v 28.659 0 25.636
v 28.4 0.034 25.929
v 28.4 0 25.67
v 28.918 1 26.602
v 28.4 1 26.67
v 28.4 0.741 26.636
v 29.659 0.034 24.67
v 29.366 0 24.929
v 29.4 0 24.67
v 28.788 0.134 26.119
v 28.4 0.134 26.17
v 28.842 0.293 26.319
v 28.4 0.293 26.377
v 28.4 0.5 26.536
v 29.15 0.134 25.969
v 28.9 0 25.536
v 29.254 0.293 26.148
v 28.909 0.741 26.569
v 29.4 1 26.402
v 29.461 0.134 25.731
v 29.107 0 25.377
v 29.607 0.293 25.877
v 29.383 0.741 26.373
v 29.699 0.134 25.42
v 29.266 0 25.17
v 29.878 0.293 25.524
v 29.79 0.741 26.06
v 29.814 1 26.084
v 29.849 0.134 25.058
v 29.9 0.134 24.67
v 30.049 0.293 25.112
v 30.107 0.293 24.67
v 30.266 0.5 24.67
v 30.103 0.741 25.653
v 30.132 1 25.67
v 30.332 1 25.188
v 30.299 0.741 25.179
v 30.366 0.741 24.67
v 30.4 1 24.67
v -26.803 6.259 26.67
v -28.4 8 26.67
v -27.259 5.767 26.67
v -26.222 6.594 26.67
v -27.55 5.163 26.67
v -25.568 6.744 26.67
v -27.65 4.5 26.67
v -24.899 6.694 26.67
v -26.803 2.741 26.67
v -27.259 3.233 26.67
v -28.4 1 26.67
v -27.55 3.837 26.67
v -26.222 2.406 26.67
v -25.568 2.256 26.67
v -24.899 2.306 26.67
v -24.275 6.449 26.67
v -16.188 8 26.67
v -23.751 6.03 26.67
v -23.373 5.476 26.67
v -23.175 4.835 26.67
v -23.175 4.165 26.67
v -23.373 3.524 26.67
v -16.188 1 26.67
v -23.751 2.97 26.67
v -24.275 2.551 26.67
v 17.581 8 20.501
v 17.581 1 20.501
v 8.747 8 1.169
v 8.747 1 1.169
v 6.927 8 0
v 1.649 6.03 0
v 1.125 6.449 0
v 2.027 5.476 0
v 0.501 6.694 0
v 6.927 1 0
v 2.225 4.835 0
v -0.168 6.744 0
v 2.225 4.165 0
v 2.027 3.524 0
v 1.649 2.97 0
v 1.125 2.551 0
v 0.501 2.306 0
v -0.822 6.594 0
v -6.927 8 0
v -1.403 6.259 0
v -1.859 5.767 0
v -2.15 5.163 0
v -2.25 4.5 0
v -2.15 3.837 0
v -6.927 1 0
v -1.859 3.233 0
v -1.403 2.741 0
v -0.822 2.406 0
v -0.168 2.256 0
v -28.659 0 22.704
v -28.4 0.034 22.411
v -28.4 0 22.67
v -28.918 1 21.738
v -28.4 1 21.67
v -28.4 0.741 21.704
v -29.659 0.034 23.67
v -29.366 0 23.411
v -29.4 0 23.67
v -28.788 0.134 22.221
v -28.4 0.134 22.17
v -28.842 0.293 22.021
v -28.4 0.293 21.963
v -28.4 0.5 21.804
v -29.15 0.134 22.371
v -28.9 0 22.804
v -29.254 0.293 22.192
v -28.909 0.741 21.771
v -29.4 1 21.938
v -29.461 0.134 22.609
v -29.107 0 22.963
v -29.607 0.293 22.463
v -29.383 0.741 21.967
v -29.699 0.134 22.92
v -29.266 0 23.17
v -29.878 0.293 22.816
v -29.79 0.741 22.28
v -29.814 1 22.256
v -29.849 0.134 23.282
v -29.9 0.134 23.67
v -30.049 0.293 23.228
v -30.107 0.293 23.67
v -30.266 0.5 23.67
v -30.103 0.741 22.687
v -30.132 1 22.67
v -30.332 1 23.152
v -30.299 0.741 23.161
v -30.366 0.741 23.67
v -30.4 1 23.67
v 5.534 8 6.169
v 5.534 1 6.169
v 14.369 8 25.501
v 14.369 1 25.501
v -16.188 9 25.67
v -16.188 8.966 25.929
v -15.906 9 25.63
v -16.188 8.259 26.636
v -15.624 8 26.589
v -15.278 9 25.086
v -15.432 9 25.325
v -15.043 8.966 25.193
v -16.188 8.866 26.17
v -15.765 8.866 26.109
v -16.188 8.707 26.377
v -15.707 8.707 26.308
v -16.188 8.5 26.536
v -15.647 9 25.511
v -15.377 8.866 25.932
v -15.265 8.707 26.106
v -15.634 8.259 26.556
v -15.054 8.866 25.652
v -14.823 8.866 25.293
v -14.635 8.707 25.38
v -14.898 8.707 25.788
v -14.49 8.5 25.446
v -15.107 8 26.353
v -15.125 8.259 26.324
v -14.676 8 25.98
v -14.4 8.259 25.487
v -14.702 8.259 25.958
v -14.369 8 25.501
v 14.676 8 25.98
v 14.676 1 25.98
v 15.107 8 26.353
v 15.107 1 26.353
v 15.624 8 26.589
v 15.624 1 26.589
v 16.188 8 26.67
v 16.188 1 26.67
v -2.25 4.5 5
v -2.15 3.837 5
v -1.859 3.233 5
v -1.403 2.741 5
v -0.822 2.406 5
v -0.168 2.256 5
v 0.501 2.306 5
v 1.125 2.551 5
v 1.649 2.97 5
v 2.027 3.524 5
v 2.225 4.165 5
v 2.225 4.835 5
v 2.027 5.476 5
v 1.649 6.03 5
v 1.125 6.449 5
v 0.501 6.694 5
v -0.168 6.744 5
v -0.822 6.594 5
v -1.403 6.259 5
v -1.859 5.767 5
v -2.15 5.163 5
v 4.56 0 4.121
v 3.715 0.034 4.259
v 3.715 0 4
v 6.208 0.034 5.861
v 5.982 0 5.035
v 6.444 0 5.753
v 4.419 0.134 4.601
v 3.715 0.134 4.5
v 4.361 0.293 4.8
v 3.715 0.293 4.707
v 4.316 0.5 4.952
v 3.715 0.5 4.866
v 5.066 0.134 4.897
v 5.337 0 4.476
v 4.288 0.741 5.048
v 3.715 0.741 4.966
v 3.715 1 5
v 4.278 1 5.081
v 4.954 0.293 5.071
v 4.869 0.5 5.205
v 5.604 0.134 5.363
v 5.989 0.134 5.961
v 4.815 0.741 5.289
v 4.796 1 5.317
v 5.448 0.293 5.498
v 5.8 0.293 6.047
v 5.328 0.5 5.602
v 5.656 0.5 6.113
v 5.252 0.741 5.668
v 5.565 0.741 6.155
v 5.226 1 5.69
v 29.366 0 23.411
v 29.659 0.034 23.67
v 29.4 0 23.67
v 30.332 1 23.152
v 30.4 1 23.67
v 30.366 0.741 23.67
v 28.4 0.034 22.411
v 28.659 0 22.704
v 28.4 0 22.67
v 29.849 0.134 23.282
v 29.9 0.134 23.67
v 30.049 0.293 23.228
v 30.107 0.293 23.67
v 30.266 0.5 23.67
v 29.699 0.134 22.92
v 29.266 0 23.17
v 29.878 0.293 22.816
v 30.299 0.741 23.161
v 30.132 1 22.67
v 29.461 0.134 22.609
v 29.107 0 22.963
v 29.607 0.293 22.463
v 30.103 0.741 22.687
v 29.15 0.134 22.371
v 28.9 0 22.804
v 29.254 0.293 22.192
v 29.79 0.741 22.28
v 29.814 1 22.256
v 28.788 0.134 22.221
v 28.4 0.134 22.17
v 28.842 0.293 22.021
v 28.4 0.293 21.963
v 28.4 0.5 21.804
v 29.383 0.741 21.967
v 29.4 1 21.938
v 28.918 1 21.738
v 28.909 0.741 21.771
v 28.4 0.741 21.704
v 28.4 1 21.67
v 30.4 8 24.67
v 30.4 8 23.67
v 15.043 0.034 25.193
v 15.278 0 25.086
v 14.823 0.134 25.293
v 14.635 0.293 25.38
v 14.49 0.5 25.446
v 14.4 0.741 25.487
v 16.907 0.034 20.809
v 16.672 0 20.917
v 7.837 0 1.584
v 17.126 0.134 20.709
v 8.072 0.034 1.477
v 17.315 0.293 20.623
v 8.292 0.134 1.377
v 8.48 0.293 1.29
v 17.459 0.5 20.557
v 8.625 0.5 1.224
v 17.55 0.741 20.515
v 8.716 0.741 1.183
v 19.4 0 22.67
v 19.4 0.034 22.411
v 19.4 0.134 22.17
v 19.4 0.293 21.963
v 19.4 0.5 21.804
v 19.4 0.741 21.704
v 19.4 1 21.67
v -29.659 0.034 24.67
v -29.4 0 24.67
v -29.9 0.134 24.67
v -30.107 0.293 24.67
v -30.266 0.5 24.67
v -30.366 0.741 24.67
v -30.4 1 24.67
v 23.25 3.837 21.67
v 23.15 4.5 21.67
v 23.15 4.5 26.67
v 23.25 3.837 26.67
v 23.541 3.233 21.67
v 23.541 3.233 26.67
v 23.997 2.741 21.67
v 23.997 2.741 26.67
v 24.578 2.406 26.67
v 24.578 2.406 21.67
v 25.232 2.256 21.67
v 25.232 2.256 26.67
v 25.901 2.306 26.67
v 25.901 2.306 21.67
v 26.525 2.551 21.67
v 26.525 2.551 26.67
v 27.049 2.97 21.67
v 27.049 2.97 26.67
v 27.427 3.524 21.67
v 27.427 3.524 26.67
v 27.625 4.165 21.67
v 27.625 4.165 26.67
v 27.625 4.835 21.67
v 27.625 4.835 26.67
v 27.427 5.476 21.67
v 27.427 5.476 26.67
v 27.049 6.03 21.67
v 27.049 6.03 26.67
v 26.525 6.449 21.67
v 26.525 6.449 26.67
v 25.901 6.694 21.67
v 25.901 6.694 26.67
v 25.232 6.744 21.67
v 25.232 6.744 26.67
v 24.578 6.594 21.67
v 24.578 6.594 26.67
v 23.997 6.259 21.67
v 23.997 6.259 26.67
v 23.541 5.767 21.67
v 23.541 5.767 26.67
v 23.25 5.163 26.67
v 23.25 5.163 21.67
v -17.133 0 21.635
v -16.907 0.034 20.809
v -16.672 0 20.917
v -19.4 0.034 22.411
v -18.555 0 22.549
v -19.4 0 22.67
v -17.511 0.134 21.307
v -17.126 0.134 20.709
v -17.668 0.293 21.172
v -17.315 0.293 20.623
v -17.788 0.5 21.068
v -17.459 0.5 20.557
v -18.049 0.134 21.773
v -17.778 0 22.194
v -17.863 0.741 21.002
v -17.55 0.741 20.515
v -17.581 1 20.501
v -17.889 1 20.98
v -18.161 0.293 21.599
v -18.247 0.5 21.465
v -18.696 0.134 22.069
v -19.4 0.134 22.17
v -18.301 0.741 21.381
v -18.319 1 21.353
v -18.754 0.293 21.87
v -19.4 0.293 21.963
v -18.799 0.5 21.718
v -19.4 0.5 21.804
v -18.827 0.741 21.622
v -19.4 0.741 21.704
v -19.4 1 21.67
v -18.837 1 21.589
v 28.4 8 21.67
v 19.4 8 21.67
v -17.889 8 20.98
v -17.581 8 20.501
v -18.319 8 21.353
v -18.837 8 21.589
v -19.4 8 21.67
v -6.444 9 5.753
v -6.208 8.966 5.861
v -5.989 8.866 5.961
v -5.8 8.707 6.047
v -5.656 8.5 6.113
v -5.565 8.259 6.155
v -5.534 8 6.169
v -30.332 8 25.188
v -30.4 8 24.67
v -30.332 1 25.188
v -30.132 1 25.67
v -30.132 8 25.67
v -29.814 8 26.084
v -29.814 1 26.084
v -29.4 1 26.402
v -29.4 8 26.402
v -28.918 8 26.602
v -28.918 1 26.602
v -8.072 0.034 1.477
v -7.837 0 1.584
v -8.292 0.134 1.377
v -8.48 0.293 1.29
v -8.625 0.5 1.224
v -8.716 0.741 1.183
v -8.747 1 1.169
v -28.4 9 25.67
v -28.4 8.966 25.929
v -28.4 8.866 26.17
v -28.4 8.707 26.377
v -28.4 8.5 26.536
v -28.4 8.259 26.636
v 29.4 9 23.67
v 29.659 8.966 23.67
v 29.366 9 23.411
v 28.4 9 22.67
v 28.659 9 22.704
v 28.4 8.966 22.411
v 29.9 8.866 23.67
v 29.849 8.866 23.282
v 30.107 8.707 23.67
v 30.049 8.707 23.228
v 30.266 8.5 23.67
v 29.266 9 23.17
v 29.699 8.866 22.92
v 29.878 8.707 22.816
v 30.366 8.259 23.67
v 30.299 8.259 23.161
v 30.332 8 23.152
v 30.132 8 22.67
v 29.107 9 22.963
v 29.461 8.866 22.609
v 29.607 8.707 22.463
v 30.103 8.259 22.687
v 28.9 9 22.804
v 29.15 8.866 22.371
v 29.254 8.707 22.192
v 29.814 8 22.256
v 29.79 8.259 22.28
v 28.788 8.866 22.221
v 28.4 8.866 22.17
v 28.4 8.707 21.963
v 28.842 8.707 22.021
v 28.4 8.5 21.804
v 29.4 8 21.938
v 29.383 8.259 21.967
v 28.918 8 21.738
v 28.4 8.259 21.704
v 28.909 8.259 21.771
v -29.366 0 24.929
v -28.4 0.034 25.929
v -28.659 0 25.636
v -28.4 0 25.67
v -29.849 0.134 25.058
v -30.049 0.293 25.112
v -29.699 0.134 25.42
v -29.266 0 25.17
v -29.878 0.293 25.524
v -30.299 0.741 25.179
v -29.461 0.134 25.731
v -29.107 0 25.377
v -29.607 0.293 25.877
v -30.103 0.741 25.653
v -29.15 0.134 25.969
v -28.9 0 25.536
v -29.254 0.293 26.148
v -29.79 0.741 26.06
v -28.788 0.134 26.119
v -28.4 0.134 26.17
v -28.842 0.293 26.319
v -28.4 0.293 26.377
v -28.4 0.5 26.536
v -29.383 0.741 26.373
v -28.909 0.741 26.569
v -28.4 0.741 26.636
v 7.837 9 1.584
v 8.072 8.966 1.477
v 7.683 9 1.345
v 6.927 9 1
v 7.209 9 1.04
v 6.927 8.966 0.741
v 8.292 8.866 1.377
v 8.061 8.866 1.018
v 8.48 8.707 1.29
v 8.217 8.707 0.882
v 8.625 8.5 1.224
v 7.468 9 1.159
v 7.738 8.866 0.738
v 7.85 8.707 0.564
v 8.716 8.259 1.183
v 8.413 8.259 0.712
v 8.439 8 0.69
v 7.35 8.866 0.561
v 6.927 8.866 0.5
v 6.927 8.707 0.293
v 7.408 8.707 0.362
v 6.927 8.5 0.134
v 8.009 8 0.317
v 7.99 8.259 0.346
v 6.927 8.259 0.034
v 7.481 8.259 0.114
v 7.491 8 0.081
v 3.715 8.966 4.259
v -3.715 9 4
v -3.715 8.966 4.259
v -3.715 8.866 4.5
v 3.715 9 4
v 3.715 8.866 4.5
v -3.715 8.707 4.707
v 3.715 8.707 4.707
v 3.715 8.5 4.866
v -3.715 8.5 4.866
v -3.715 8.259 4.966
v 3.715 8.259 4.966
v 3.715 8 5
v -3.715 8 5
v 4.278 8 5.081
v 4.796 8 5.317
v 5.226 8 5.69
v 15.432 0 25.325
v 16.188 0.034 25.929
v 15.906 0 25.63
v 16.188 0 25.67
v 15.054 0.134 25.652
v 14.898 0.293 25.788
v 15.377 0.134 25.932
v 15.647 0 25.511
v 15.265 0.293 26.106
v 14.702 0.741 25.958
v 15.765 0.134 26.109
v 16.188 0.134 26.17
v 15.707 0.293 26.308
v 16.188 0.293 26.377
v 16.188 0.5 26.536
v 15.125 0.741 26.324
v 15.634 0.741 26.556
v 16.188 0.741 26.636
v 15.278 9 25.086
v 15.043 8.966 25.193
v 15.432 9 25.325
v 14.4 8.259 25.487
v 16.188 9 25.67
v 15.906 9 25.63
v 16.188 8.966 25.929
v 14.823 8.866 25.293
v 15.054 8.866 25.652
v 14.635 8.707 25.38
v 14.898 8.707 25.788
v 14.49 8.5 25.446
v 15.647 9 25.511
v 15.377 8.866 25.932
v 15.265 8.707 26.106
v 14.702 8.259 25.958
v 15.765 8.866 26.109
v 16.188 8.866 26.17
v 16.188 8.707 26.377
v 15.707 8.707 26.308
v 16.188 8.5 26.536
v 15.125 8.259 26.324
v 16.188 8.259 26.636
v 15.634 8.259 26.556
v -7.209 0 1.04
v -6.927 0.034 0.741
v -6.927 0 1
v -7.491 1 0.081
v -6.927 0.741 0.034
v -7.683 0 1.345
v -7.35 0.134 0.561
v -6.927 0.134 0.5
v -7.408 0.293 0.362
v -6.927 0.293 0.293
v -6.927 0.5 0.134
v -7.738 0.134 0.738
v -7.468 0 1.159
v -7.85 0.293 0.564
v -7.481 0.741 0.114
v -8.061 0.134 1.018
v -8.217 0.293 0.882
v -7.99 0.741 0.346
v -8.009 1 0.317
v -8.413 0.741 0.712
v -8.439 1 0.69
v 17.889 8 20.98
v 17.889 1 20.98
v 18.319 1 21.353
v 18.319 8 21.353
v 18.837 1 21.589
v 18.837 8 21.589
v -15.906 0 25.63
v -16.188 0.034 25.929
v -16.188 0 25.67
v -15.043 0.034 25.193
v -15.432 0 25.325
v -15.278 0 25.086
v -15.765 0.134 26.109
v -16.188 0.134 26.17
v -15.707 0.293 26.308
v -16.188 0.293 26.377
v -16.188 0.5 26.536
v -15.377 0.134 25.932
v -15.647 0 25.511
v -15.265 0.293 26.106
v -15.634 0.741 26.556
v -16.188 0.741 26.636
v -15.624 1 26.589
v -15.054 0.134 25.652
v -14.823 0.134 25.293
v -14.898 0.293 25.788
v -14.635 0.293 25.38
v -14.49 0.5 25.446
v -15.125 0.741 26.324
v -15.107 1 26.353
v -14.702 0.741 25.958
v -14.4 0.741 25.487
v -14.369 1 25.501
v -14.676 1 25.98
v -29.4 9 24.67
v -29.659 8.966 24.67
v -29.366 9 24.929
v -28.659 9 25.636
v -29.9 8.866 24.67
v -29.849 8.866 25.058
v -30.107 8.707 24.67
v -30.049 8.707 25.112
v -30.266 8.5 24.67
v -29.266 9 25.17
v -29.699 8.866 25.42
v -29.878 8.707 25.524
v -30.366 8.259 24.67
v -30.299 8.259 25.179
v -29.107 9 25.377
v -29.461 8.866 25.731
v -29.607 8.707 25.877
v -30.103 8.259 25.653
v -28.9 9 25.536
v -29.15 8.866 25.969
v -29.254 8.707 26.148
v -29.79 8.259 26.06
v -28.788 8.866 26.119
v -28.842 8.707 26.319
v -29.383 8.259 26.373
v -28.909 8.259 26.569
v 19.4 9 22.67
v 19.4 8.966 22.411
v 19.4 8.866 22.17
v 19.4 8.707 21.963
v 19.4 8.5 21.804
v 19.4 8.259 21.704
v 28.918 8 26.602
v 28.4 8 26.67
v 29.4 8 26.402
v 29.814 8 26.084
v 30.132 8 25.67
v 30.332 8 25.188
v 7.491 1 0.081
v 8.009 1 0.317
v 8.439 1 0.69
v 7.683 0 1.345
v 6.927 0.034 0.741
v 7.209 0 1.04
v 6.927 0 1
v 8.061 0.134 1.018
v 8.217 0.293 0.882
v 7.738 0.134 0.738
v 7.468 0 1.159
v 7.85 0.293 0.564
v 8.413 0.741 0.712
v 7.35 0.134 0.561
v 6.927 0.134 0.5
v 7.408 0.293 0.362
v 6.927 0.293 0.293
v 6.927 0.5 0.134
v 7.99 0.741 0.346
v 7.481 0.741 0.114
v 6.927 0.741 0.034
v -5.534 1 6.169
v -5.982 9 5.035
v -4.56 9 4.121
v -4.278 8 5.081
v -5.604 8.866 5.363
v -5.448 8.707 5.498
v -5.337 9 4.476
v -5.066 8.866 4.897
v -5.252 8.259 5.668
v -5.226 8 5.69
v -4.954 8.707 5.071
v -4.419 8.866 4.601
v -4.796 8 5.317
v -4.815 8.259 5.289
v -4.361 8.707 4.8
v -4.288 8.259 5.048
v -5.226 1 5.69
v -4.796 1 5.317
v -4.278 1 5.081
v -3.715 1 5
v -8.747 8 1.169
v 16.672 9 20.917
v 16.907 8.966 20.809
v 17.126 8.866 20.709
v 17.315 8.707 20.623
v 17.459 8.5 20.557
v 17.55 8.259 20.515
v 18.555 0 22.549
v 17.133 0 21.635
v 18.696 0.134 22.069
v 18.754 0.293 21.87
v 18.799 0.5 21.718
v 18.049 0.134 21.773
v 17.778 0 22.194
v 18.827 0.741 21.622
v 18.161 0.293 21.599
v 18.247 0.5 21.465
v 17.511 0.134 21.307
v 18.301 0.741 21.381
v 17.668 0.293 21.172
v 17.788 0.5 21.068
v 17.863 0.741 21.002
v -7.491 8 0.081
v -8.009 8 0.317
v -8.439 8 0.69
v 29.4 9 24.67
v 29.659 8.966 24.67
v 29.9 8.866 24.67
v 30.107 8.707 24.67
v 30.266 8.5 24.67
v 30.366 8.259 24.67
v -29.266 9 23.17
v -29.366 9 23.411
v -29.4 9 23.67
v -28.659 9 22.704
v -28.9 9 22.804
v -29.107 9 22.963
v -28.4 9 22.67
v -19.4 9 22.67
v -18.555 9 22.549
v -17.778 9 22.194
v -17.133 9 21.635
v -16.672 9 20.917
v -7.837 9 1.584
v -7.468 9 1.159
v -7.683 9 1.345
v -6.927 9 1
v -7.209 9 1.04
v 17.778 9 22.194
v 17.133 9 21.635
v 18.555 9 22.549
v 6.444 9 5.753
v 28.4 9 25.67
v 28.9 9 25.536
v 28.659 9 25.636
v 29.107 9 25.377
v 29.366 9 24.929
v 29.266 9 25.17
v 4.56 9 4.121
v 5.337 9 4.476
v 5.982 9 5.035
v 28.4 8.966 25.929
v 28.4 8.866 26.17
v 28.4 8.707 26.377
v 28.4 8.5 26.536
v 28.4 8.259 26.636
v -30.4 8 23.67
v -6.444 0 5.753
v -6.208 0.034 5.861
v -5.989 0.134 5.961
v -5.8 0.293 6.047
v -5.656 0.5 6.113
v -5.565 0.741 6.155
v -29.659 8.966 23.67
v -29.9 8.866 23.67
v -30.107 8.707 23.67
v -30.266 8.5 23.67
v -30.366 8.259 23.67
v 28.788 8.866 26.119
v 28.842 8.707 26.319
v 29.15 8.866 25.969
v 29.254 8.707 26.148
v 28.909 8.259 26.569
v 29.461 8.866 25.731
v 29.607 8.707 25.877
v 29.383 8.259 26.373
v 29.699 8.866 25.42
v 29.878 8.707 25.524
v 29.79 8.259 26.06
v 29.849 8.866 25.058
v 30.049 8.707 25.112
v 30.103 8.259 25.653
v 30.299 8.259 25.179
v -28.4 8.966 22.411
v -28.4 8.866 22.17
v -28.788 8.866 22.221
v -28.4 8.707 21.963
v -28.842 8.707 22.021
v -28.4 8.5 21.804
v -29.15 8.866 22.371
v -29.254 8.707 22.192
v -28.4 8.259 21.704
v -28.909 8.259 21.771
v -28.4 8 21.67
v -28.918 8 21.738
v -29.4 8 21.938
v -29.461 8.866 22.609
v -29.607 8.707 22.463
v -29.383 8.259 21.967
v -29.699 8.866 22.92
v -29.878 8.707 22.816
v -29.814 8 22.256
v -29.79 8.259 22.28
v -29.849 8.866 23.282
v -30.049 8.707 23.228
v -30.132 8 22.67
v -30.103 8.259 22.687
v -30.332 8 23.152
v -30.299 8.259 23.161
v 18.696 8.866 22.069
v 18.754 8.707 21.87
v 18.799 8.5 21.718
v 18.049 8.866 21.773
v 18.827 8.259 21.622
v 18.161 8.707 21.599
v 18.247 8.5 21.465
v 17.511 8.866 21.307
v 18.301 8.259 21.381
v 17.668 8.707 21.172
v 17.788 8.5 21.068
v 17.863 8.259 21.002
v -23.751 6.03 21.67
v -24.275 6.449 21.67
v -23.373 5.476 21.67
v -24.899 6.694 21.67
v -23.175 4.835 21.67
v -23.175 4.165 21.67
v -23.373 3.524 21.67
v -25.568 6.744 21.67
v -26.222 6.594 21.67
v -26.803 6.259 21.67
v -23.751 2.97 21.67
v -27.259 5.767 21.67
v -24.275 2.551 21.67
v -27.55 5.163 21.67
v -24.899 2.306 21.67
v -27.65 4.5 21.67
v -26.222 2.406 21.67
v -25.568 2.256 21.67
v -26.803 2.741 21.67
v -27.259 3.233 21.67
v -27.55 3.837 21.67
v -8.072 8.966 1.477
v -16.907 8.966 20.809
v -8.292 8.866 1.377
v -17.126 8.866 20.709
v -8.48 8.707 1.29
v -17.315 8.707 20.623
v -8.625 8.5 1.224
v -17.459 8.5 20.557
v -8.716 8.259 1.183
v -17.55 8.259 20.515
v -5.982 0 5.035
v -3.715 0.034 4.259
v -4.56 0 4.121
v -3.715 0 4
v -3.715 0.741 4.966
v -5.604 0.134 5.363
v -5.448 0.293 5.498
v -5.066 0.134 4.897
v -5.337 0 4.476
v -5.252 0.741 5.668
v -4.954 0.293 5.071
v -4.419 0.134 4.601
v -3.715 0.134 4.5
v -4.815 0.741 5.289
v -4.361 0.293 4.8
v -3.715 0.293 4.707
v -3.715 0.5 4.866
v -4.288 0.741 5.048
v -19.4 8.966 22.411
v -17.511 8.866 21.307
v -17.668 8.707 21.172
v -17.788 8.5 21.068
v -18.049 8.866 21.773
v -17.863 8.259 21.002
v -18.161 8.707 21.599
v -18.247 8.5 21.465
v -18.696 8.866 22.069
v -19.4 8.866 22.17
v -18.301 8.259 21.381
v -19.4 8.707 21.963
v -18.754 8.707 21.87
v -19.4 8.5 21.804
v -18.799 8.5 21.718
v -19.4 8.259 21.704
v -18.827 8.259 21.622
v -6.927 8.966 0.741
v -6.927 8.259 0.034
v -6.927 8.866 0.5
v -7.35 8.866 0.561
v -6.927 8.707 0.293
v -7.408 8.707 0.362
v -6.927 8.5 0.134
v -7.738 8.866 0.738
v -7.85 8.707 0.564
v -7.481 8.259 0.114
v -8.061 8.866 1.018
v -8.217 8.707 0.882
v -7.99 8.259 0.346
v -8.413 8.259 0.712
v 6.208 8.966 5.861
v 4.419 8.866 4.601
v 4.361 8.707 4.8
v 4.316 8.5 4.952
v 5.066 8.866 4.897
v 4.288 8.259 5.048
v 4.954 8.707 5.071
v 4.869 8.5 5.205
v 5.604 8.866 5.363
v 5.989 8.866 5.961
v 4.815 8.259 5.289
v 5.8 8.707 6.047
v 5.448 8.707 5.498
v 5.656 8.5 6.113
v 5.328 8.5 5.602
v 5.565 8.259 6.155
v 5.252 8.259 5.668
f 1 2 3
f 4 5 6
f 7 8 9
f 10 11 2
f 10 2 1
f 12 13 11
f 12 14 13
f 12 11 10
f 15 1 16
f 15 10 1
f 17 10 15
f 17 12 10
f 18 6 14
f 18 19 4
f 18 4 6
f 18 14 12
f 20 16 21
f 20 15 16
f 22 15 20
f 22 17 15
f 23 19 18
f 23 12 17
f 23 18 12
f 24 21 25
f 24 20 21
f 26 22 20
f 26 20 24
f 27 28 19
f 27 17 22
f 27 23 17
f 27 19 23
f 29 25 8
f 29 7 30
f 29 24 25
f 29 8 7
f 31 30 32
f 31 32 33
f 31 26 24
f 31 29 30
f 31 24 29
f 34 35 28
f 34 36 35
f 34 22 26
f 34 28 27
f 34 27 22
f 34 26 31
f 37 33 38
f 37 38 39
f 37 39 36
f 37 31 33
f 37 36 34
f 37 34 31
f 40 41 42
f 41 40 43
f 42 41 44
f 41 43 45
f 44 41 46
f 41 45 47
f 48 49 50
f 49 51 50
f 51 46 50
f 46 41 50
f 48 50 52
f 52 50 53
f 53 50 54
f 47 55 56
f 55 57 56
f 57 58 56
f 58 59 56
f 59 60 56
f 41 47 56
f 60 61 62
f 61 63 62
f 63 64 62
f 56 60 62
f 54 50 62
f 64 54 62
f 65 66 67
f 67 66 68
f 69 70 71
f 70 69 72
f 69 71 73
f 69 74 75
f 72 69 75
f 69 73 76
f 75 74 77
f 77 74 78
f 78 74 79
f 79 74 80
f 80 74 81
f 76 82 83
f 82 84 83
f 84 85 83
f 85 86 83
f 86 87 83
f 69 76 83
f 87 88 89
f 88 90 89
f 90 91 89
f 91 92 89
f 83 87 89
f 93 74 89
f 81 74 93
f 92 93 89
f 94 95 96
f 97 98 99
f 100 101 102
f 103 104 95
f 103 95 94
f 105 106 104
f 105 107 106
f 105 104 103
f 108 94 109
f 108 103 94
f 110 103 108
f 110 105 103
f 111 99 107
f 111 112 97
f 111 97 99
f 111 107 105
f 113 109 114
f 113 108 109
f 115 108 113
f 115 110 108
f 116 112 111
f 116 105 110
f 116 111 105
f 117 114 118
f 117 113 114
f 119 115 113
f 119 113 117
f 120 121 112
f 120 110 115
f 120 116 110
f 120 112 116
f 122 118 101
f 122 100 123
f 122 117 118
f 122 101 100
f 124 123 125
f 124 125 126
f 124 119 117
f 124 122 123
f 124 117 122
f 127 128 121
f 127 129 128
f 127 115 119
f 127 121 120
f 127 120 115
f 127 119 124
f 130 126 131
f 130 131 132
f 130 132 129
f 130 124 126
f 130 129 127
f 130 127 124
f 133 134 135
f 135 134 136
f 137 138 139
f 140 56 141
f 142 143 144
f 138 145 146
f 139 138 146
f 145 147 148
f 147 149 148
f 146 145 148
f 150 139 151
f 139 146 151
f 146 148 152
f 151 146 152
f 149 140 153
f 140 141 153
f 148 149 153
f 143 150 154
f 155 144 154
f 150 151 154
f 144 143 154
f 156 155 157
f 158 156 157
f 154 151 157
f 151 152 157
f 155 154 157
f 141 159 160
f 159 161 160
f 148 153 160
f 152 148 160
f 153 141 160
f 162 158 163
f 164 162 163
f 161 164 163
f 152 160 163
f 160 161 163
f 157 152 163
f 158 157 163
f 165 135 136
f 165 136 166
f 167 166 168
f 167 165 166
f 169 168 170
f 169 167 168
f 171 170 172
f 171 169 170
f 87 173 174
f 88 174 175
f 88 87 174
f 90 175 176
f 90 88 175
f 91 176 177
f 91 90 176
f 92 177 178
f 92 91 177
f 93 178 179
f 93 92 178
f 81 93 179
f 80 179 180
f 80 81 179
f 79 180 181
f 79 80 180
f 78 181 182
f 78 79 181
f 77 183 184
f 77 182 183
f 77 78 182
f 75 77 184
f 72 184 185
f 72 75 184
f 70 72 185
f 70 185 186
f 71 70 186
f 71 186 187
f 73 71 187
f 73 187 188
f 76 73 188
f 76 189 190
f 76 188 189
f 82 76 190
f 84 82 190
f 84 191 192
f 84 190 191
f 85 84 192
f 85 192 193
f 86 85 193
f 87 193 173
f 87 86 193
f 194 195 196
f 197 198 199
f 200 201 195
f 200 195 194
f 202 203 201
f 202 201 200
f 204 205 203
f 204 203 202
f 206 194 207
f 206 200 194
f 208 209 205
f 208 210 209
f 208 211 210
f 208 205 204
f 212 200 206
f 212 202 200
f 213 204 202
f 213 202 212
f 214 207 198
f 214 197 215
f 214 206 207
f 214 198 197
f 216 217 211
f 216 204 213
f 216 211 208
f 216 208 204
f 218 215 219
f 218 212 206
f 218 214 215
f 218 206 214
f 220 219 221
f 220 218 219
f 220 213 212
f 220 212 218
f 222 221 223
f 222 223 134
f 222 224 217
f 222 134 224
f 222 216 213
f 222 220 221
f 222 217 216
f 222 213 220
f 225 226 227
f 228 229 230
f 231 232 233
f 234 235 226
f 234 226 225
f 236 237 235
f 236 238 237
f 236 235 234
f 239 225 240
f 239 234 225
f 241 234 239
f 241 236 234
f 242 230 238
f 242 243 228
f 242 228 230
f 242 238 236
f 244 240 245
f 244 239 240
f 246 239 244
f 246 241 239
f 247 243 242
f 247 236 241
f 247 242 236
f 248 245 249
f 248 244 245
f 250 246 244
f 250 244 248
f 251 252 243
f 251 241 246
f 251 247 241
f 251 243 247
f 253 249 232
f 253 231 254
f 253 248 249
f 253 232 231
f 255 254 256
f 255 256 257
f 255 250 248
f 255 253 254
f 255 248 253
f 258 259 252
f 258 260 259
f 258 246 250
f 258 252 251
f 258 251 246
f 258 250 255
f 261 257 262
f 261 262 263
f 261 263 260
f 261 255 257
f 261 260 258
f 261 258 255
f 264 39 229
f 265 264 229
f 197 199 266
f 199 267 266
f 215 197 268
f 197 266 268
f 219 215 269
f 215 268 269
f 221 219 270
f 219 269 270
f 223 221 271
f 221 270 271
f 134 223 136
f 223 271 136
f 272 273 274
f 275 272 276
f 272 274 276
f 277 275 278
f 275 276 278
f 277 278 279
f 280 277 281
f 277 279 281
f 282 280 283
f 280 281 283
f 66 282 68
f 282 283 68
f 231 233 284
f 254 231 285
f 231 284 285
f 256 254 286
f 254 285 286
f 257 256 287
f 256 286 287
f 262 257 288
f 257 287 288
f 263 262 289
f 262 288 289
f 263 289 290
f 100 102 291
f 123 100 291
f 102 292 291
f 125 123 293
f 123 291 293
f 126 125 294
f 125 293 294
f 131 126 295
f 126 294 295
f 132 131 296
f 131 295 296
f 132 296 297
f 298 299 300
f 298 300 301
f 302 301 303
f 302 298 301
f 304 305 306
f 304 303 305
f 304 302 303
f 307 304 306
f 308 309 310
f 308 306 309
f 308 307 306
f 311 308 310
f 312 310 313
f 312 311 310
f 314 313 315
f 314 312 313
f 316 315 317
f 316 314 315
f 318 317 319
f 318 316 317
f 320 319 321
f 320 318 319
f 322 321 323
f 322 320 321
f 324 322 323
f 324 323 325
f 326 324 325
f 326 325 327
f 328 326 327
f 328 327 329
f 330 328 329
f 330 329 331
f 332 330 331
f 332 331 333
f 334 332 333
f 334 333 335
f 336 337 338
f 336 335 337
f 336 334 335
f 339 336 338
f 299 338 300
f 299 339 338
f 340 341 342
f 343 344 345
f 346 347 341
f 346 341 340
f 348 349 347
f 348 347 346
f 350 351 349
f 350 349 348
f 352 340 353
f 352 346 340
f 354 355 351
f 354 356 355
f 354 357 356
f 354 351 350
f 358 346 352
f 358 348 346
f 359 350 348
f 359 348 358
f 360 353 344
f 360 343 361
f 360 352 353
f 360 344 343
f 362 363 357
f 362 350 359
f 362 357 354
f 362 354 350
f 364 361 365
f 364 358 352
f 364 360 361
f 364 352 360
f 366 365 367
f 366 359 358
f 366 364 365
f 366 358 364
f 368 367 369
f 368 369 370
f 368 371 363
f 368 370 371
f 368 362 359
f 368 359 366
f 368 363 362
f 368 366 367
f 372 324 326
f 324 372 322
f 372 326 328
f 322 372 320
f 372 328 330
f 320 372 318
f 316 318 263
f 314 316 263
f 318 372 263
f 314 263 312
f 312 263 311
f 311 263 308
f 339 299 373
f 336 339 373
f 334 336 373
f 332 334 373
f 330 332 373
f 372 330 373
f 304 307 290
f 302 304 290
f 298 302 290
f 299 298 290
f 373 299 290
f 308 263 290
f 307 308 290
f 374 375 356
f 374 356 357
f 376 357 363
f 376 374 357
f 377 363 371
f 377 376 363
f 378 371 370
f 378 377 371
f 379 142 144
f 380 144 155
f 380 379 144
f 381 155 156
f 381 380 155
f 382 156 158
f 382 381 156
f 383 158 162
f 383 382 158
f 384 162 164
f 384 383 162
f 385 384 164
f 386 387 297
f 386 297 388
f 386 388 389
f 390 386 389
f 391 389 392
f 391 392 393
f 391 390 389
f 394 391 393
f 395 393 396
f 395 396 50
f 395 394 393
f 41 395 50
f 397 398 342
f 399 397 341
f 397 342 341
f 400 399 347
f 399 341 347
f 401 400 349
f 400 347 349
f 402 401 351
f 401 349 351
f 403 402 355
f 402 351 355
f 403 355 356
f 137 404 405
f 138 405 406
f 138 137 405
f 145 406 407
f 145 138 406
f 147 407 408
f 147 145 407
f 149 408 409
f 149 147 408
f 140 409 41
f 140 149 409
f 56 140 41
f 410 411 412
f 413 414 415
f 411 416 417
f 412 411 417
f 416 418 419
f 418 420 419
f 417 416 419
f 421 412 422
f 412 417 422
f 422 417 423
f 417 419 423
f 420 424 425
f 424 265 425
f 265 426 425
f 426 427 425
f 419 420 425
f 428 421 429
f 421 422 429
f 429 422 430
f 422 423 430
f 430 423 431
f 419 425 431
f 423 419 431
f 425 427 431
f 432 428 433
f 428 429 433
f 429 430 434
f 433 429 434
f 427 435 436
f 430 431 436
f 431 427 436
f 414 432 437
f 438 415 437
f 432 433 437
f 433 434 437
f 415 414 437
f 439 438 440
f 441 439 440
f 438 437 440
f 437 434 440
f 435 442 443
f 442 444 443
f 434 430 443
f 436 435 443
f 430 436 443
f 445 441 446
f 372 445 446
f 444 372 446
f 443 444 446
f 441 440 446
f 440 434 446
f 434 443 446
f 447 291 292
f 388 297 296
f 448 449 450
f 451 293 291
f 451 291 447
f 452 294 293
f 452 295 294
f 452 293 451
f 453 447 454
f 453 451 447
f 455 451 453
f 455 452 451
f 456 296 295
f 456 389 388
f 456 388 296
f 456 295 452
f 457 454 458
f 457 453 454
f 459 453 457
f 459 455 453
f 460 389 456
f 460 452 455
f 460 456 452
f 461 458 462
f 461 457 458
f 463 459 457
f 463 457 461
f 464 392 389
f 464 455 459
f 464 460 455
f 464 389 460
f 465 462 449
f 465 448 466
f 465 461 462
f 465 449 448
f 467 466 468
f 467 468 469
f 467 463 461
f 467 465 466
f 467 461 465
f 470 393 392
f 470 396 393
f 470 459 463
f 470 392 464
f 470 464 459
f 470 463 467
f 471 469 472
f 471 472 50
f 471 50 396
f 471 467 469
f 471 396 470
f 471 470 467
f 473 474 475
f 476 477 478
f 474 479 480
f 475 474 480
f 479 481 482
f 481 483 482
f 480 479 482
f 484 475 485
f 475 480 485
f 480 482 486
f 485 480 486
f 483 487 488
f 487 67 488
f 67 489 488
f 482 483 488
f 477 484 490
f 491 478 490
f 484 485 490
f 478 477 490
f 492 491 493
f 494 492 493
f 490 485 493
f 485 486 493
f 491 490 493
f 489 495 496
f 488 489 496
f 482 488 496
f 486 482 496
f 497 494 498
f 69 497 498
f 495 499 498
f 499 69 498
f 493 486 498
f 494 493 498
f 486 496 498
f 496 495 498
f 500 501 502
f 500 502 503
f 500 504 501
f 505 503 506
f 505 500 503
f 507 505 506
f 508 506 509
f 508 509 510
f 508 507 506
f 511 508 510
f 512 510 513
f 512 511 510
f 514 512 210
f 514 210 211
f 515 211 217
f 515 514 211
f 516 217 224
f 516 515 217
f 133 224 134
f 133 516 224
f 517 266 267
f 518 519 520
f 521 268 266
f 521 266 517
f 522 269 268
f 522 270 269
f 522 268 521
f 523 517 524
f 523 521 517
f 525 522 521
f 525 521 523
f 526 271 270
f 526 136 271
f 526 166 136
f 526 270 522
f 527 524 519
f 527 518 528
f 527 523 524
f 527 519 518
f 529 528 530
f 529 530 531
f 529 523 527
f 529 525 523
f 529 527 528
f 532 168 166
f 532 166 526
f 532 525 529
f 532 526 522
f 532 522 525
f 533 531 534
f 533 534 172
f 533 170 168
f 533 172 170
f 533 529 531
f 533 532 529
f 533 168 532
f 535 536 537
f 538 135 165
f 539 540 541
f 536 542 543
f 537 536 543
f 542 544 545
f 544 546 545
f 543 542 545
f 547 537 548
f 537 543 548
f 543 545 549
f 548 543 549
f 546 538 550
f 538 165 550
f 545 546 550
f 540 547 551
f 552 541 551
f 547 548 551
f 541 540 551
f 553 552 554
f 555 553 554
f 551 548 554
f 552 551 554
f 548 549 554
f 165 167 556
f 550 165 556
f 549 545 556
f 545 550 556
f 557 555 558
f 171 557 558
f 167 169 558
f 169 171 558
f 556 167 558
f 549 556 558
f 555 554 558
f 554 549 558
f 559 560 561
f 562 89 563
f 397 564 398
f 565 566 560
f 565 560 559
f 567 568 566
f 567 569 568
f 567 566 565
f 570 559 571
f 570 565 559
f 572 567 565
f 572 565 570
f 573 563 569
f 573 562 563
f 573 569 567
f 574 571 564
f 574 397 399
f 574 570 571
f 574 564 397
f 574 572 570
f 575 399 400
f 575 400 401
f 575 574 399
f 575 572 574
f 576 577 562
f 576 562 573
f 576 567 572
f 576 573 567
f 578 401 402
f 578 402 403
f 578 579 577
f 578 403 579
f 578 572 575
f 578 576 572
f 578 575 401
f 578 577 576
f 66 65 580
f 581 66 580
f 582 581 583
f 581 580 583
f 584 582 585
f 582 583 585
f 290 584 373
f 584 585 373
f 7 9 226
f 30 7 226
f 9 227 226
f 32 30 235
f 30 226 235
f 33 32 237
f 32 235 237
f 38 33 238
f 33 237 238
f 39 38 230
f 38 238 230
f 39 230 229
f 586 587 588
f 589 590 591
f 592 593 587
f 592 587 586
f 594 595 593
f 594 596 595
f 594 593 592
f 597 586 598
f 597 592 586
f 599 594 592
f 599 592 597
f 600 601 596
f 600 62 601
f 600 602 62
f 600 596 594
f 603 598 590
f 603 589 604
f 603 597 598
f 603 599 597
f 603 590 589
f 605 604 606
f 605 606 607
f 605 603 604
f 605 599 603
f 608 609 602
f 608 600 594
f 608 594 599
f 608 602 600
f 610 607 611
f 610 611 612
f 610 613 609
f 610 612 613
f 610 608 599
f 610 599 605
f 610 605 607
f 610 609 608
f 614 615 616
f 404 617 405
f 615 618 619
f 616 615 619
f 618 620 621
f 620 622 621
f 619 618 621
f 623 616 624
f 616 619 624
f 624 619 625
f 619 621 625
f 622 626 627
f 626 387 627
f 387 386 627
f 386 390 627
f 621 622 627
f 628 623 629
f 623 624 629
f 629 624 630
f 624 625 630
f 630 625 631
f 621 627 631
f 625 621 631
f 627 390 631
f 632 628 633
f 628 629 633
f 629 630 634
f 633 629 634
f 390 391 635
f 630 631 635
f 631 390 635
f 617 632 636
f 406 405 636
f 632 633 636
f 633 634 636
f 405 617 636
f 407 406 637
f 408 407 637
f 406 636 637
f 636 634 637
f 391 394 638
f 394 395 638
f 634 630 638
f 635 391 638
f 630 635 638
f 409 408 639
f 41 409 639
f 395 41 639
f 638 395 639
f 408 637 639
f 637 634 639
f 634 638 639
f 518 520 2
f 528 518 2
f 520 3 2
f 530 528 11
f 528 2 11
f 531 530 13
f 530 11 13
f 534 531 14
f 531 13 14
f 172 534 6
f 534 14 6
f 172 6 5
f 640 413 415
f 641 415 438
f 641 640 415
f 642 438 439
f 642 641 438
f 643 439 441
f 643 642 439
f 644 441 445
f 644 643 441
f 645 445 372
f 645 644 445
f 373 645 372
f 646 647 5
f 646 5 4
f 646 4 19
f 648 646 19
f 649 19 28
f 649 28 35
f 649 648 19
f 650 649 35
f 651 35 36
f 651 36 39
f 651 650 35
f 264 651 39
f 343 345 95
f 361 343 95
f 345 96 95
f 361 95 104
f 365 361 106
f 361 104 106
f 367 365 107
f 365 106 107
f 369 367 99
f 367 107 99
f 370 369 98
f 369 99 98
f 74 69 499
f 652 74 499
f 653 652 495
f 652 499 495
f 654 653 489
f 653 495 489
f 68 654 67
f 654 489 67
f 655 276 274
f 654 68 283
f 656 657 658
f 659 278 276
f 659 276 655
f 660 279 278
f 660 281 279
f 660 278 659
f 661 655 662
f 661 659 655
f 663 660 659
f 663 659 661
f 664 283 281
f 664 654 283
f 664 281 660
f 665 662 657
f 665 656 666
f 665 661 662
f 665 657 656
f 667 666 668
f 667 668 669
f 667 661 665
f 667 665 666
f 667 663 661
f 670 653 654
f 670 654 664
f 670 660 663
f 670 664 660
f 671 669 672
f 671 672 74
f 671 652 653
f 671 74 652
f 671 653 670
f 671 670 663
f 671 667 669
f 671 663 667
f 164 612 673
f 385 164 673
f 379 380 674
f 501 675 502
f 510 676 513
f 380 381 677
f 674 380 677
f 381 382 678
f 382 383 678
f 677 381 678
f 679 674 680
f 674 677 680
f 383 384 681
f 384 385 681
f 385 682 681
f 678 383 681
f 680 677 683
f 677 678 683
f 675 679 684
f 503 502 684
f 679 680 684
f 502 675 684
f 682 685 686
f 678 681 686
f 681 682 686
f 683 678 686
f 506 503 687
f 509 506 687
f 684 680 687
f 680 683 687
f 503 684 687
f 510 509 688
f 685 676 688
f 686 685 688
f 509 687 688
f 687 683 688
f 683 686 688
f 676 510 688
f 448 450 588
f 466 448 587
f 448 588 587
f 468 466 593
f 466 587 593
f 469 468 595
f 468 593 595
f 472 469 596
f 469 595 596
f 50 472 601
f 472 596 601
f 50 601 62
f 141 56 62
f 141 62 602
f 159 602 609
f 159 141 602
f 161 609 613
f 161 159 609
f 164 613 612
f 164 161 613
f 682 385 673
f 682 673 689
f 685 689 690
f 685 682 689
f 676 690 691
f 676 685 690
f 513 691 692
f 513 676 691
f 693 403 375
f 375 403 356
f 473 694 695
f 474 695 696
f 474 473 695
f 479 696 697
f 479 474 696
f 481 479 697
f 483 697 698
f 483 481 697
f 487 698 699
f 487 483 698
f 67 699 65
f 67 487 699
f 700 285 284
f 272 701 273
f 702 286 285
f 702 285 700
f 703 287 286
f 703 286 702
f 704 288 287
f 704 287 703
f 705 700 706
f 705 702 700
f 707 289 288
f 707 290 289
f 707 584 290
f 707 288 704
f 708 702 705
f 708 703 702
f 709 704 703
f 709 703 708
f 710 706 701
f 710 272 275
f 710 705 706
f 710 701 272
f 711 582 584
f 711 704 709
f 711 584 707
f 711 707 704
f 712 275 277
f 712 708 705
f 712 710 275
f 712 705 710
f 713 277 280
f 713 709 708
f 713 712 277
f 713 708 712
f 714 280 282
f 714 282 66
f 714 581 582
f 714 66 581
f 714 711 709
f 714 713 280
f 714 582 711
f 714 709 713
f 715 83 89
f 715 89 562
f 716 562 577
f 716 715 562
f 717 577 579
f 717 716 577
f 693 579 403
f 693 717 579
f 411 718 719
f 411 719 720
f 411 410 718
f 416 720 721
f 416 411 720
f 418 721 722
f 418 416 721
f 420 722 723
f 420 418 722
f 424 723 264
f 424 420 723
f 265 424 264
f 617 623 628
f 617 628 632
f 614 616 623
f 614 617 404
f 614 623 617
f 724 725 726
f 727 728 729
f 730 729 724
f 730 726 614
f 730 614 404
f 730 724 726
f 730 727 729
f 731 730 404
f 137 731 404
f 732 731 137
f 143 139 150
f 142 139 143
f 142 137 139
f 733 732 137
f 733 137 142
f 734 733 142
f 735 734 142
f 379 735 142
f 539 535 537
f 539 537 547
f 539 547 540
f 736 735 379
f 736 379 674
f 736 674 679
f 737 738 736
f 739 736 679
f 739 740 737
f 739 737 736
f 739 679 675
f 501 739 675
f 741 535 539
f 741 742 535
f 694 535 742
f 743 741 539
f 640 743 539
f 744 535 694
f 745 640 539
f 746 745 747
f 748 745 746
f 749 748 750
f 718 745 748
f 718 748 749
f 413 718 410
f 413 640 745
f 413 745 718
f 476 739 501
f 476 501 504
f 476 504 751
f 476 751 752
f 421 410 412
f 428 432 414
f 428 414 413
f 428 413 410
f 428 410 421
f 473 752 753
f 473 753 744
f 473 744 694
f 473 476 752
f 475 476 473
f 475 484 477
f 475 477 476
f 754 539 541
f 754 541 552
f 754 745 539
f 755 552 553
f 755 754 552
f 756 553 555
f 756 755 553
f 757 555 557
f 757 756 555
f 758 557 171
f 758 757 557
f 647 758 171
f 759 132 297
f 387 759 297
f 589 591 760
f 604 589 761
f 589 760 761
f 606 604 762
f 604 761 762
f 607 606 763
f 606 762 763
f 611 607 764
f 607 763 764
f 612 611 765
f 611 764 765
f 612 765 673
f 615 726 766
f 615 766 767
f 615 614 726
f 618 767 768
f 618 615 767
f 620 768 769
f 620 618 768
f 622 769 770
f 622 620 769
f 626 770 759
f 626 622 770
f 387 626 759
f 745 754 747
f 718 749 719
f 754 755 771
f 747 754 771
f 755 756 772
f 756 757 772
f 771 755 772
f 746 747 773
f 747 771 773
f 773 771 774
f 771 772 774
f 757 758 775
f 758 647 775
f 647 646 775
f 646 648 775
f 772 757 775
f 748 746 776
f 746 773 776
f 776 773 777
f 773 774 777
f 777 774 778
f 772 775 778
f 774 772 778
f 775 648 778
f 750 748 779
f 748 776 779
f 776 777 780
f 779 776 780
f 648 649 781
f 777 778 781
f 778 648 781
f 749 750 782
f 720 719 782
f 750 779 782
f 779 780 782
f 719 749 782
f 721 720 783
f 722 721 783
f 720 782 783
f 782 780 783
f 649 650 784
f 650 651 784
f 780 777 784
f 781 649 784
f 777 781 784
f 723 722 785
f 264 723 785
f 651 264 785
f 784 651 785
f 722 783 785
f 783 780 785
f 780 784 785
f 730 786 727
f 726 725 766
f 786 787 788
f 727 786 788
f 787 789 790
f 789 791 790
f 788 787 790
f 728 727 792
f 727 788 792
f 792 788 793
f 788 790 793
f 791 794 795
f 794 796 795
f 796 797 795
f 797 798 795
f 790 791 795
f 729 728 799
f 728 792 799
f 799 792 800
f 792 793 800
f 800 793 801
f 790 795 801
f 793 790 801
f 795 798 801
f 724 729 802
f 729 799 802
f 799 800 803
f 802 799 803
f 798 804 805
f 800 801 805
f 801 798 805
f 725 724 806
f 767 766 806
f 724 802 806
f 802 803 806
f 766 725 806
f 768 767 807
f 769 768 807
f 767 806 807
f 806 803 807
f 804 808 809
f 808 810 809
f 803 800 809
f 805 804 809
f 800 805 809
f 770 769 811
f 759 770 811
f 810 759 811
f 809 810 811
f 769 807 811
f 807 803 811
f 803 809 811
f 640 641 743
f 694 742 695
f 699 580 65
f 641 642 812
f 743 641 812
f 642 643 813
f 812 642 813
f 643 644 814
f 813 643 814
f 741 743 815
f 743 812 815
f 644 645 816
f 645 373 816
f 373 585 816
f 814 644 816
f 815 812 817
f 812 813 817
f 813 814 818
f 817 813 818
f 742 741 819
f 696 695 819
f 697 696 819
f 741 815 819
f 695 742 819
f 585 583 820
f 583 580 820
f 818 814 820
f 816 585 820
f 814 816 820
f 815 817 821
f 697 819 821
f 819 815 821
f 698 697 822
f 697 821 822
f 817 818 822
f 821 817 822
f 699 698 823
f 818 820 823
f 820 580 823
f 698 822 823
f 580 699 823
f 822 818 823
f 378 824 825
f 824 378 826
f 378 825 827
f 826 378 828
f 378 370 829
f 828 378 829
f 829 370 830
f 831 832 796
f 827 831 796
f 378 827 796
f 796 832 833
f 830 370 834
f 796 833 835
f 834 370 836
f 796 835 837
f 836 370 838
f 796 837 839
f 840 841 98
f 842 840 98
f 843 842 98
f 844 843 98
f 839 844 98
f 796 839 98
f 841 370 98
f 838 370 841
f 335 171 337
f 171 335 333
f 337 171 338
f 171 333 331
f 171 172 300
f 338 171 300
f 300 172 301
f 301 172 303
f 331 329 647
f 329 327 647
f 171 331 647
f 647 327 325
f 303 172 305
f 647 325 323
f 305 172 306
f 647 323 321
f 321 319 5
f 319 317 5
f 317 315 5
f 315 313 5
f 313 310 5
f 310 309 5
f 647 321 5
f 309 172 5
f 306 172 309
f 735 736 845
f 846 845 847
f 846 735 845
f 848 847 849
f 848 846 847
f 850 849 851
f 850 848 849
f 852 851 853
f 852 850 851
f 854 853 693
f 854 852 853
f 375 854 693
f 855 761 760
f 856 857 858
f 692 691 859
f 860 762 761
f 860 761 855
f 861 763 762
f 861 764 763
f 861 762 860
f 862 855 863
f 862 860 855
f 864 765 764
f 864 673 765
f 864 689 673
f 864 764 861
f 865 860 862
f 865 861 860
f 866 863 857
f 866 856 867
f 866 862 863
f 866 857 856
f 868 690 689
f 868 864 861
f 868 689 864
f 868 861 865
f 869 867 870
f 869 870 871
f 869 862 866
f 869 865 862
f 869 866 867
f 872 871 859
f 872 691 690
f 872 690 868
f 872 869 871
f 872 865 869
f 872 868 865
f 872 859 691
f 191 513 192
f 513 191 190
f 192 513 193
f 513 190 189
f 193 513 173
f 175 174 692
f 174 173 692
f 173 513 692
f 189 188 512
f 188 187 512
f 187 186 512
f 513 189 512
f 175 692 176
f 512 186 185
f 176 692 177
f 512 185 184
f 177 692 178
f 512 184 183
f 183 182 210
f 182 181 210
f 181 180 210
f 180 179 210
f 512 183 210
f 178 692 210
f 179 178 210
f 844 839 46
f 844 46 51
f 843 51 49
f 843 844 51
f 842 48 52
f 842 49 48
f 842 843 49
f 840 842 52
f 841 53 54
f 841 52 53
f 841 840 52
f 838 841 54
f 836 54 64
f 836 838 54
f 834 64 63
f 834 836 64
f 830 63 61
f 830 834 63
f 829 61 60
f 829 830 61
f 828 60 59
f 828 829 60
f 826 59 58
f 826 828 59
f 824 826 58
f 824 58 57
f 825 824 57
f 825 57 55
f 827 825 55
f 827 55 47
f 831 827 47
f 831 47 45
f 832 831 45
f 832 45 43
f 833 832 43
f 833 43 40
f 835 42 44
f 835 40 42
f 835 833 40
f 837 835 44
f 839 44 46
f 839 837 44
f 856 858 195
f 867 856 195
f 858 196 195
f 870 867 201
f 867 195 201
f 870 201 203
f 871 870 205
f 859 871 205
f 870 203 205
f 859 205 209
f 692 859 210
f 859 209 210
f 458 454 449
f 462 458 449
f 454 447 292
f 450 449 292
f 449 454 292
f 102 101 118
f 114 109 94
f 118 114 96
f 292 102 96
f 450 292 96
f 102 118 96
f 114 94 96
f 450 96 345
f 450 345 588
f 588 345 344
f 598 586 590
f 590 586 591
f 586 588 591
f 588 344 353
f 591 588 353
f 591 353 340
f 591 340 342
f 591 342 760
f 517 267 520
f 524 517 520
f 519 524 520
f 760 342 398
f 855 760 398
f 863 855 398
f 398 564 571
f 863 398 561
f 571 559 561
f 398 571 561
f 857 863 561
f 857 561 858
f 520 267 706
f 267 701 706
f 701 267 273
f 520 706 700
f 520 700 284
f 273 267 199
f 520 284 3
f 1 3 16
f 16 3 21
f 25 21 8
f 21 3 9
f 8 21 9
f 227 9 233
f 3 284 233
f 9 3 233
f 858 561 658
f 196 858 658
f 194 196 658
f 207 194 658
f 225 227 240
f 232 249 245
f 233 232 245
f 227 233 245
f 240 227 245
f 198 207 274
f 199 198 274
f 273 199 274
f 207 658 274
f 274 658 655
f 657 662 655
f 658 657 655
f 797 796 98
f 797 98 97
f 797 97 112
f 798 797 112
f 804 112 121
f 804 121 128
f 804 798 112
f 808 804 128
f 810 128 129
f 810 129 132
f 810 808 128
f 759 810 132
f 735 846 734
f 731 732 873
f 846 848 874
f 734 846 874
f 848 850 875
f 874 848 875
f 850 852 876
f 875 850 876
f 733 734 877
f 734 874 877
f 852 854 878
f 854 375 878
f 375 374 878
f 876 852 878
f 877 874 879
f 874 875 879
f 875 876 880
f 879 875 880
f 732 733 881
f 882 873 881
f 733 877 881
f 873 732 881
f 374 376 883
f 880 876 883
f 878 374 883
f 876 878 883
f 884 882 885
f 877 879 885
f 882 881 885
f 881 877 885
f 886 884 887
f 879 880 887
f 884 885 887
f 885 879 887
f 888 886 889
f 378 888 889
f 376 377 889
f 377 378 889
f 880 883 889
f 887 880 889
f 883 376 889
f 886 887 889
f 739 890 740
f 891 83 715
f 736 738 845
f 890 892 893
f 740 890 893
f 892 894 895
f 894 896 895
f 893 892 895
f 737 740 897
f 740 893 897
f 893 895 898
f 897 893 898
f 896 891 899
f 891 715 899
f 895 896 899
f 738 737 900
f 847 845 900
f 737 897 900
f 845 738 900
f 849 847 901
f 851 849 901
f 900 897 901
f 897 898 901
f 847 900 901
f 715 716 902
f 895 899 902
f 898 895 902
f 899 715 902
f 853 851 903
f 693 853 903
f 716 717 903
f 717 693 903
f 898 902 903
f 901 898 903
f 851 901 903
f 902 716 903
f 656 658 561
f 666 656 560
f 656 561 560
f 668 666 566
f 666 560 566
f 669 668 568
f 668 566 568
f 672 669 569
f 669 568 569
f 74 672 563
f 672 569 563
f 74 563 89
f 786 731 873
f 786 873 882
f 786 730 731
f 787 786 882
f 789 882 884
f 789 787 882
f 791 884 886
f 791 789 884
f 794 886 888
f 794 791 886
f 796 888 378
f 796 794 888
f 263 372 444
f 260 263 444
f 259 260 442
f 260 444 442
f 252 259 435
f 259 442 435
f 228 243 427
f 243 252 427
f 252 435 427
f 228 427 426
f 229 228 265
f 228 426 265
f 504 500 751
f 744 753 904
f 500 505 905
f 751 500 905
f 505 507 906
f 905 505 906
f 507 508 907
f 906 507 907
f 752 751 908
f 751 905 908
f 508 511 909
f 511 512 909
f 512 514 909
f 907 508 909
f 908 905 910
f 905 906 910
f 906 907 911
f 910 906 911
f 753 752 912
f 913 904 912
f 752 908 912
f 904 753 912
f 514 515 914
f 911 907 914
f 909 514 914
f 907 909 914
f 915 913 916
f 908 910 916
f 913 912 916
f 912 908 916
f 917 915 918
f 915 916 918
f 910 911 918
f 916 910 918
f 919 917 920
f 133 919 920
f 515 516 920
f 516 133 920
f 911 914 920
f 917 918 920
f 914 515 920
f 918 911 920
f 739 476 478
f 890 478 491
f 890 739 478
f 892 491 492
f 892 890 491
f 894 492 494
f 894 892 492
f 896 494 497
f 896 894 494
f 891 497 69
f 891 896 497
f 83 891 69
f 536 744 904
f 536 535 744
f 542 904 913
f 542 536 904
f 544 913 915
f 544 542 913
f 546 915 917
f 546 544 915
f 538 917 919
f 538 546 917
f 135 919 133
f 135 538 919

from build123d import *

# Parameters (mm, degrees)
BOSS_EXTRUDE1_DEPTH = 9
CUT_EXTRUDE1_REACH  = 43.43
SKETCH2_R           = 2.25
FILLET1_R           = 2
FILLET2_R           = 1


with BuildPart() as part:
    # Sketch1 → Boss-Extrude1 (new body)
    with BuildSketch(Plane(origin=(0, 0, 0), x_dir=(1, 0, 0), z_dir=(0, 1, 0))):
        Polygon((8.212454023, 0), (0, 0), (-8.212454023, 0), (-18.115120739, -21.67), (-20.4, -26.67), (-14.902666716, -26.67), (-5, -5), (5, -5), (14.902666716, -26.67), (20.4, -26.67), (18.115120739, -21.67), align=None)
        Polygon((-20.4, -26.67), (-18.115120739, -21.67), (-30.4, -21.67), (-30.4, -26.67), align=None)
        Polygon((30.4, -21.67), (18.115120739, -21.67), (20.4, -26.67), (30.4, -26.67), align=None)
    extrude(amount=BOSS_EXTRUDE1_DEPTH)

    # Sketch2 → Cut-Extrude1 (cut, up to next)
    with BuildSketch(Plane.XY, mode=Mode.PRIVATE) as cut_extrude1_sk1:
        with Locations(Location((0, 4.5, 0), (0, 0, 180))):
            Circle(SKETCH2_R)
    cut_extrude1_tool1 = extrude(cut_extrude1_sk1.sketch, amount=CUT_EXTRUDE1_REACH, mode=Mode.PRIVATE) & part.part
    # Sketch2 → Cut-Extrude1 (cut, up to next)
    with BuildSketch(Plane.XY, mode=Mode.PRIVATE) as cut_extrude1_sk2:
        with Locations(Location((25.4, 4.5, 0), (0, 0, 180))):
            Circle(SKETCH2_R)
    cut_extrude1_tool2 = extrude(cut_extrude1_sk2.sketch, amount=CUT_EXTRUDE1_REACH, mode=Mode.PRIVATE) & part.part
    # Sketch2 → Cut-Extrude1 (cut, up to next)
    with BuildSketch(Plane.XY, mode=Mode.PRIVATE) as cut_extrude1_sk3:
        with Locations(Location((-25.4, 4.5, 0), (0, 0, 180))):
            Circle(SKETCH2_R)
    cut_extrude1_tool3 = extrude(cut_extrude1_sk3.sketch, amount=CUT_EXTRUDE1_REACH, mode=Mode.PRIVATE) & part.part
    add(cut_extrude1_tool1.solids().sort_by_distance((0, 4.5, 0))[0], mode=Mode.SUBTRACT)
    add(cut_extrude1_tool2.solids().sort_by_distance((25.4, 4.5, 0))[0], mode=Mode.SUBTRACT)
    add(cut_extrude1_tool3.solids().sort_by_distance((-25.4, 4.5, 0))[0], mode=Mode.SUBTRACT)

    # Fillet1
    fillet1_edges = [part.edges().sort_by_distance(p)[0] for p in [
        (-5, 4.5, 5),
        (-14.902666716, 4.5, 26.67),
        (-30.4, 4.5, 26.67),
        (-30.4, 4.5, 21.67),
        (-18.115120739, 4.5, 21.67),
        (-8.212454023, 4.5, 0),
        (8.212454023, 4.5, 0),
        (18.115120739, 4.5, 21.67),
        (30.4, 4.5, 21.67),
        (30.4, 4.5, 26.67),
        (14.902666716, 4.5, 26.67),
        (5, 4.5, 5),
    ]]
    fillet(fillet1_edges, radius=FILLET1_R)

    # Fillet2
    fillet2_edges = [part.edges().sort_by_distance(p)[0] for p in [
        (0, 0, 5),
        (0, 9, 5),
        (-9.951333358, 0, 15.835),
        (-9.951333358, 9, 15.835),
        (-22.293824163, 0, 26.67),
        (-30.4, 0, 24.17),
        (-23.900051174, 0, 21.67),
        (-13.163787381, 0, 10.835),
        (0, 0, 0),
        (13.163787381, 0, 10.835),
        (23.900051174, 0, 21.67),
        (30.4, 0, 24.17),
        (22.293824163, 0, 26.67),
        (9.951333358, 0, 15.835),
        (15.106569342, 0, 26.352637285),
        (29.814213562, 0, 26.084213562),
        (29.814213562, 0, 22.255786438),
        (8.008551397, 0, 0.317362715),
        (-8.008551397, 0, 0.317362715),
        (-29.814213562, 0, 22.255786438),
        (-29.814213562, 0, 26.084213562),
        (-15.106569342, 0, 26.352637285),
        (-22.293824163, 9, 26.67),
        (9.951333358, 9, 15.835),
        (22.293824163, 9, 26.67),
        (30.4, 9, 24.17),
        (23.900051174, 9, 21.67),
        (13.163787381, 9, 10.835),
        (0, 9, 0),
        (-13.163787381, 9, 10.835),
        (-23.900051174, 9, 21.67),
        (-30.4, 9, 24.17),
        (15.106569342, 9, 26.352637285),
        (29.814213562, 9, 26.084213562),
        (29.814213562, 9, 22.255786438),
        (8.008551397, 9, 0.317362715),
        (-8.008551397, 9, 0.317362715),
        (-29.814213562, 9, 22.255786438),
        (-29.814213562, 9, 26.084213562),
        (-15.106569342, 9, 26.352637285),
        (-4.796097374, 0, 5.317362715),
        (-4.796097374, 9, 5.317362715),
        (-18.319023366, 0, 21.352637285),
        (-18.319023366, 9, 21.352637285),
        (18.319023366, 0, 21.352637285),
        (18.319023366, 9, 21.352637285),
        (4.796097374, 0, 5.317362715),
        (4.796097374, 9, 5.317362715),
    ]]
    fillet(fillet2_edges, radius=FILLET2_R)


solid = part.part
